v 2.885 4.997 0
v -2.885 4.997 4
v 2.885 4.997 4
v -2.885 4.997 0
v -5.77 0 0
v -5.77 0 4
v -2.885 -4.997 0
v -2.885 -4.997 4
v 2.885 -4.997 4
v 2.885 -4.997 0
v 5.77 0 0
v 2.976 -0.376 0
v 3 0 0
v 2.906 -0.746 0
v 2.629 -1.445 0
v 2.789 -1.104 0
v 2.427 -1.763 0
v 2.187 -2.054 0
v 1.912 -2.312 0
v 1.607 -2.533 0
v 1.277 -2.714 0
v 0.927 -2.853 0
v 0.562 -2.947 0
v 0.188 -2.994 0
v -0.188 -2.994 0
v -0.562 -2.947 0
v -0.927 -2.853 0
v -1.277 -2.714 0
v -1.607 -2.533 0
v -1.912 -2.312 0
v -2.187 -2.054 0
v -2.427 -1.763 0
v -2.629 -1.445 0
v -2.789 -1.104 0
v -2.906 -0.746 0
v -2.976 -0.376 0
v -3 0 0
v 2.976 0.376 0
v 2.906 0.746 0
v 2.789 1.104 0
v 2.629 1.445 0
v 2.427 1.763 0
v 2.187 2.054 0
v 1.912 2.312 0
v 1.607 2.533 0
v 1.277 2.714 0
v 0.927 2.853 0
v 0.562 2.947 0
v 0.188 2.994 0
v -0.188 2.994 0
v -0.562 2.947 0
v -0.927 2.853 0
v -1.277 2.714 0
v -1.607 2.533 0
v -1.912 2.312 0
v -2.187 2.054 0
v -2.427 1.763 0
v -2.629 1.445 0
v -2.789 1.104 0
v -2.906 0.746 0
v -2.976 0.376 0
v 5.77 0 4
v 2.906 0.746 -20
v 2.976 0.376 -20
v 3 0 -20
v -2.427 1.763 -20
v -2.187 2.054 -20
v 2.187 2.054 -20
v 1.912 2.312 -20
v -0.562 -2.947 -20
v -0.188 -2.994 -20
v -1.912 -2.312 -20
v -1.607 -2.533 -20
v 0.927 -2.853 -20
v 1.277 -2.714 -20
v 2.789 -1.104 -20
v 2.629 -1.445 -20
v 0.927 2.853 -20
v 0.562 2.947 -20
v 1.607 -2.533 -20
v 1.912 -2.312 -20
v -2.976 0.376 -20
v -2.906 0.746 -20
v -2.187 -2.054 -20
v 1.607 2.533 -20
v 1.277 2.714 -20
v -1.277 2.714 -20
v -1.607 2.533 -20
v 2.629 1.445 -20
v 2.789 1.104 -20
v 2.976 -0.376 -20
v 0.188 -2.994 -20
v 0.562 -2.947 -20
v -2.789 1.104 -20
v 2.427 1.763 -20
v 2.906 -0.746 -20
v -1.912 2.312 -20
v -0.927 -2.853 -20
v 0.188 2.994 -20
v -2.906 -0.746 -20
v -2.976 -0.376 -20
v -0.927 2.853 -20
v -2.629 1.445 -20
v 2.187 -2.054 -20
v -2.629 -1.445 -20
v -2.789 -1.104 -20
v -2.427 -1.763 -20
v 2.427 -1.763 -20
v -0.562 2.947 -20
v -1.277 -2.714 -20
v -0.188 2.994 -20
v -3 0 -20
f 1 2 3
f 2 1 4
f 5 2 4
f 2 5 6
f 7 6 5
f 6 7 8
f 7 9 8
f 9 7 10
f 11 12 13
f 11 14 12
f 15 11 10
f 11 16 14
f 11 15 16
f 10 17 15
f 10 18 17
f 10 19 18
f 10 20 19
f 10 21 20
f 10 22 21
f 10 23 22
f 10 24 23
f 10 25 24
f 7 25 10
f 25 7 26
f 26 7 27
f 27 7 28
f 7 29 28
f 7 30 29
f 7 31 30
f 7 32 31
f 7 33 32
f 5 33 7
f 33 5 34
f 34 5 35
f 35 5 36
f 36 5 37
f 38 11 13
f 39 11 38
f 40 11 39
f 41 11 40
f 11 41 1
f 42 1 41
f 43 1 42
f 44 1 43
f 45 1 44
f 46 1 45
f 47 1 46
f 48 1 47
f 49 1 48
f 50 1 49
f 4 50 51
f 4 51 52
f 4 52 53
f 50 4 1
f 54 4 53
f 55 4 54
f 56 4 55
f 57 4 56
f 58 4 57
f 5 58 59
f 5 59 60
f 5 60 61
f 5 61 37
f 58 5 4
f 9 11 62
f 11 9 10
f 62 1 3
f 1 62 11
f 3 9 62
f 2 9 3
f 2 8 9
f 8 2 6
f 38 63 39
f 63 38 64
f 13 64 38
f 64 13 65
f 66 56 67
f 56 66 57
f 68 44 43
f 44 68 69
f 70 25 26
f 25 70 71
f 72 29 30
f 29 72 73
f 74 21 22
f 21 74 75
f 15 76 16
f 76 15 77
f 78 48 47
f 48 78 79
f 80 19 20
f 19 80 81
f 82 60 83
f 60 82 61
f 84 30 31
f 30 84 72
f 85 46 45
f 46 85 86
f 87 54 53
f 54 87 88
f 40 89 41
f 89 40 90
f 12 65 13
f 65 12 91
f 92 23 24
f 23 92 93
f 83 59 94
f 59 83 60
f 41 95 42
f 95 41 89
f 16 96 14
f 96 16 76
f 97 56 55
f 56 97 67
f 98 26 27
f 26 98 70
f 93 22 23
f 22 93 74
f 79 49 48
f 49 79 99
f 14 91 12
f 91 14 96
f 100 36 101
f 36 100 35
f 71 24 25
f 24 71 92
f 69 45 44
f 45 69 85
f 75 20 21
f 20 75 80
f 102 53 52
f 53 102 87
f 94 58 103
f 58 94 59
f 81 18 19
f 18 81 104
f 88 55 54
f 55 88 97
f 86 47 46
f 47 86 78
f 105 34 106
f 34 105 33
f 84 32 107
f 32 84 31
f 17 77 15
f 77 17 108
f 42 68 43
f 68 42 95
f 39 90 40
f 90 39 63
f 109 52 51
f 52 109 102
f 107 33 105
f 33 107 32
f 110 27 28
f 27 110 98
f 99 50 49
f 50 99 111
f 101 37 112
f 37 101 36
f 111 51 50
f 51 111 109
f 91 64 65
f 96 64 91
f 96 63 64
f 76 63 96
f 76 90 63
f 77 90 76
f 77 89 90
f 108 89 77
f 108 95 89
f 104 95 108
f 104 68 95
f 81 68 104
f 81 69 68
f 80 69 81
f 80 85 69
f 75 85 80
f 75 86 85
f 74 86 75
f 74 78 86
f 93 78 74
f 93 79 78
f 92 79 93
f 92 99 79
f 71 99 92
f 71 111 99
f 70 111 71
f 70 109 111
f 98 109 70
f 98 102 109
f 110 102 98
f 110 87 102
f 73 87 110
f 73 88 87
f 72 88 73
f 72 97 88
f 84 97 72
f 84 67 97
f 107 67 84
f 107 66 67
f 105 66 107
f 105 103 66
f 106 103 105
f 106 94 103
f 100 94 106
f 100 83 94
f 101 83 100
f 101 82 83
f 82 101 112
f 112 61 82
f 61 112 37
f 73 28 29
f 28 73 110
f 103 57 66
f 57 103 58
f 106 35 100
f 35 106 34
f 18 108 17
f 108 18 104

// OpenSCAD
$fn = 50;


difference() {
	union() {
		translate(v = [0, 0, 0]) {
			rotate(a = [0, 0, 0]) {
				translate(v = [0, 0, 0]) {
					rotate(a = [0, 0, 0]) {
						linear_extrude(height = 4) {
							polygon(points = [[5.7700000000, 0.0000000000], [2.8850000000, 4.9969665798], [-2.8850000000, 4.9969665798], [-5.7700000000, 0.0000000000], [-2.8850000000, -4.9969665798], [2.8850000000, -4.9969665798]]);
						}
					}
				}
			}
		}
		translate(v = [0, 0, -20]) {
			rotate(a = [0, 0, 0]) {
				cylinder(h = 20, r = 3.0000000000);
			}
		}
	}
	union();
}
